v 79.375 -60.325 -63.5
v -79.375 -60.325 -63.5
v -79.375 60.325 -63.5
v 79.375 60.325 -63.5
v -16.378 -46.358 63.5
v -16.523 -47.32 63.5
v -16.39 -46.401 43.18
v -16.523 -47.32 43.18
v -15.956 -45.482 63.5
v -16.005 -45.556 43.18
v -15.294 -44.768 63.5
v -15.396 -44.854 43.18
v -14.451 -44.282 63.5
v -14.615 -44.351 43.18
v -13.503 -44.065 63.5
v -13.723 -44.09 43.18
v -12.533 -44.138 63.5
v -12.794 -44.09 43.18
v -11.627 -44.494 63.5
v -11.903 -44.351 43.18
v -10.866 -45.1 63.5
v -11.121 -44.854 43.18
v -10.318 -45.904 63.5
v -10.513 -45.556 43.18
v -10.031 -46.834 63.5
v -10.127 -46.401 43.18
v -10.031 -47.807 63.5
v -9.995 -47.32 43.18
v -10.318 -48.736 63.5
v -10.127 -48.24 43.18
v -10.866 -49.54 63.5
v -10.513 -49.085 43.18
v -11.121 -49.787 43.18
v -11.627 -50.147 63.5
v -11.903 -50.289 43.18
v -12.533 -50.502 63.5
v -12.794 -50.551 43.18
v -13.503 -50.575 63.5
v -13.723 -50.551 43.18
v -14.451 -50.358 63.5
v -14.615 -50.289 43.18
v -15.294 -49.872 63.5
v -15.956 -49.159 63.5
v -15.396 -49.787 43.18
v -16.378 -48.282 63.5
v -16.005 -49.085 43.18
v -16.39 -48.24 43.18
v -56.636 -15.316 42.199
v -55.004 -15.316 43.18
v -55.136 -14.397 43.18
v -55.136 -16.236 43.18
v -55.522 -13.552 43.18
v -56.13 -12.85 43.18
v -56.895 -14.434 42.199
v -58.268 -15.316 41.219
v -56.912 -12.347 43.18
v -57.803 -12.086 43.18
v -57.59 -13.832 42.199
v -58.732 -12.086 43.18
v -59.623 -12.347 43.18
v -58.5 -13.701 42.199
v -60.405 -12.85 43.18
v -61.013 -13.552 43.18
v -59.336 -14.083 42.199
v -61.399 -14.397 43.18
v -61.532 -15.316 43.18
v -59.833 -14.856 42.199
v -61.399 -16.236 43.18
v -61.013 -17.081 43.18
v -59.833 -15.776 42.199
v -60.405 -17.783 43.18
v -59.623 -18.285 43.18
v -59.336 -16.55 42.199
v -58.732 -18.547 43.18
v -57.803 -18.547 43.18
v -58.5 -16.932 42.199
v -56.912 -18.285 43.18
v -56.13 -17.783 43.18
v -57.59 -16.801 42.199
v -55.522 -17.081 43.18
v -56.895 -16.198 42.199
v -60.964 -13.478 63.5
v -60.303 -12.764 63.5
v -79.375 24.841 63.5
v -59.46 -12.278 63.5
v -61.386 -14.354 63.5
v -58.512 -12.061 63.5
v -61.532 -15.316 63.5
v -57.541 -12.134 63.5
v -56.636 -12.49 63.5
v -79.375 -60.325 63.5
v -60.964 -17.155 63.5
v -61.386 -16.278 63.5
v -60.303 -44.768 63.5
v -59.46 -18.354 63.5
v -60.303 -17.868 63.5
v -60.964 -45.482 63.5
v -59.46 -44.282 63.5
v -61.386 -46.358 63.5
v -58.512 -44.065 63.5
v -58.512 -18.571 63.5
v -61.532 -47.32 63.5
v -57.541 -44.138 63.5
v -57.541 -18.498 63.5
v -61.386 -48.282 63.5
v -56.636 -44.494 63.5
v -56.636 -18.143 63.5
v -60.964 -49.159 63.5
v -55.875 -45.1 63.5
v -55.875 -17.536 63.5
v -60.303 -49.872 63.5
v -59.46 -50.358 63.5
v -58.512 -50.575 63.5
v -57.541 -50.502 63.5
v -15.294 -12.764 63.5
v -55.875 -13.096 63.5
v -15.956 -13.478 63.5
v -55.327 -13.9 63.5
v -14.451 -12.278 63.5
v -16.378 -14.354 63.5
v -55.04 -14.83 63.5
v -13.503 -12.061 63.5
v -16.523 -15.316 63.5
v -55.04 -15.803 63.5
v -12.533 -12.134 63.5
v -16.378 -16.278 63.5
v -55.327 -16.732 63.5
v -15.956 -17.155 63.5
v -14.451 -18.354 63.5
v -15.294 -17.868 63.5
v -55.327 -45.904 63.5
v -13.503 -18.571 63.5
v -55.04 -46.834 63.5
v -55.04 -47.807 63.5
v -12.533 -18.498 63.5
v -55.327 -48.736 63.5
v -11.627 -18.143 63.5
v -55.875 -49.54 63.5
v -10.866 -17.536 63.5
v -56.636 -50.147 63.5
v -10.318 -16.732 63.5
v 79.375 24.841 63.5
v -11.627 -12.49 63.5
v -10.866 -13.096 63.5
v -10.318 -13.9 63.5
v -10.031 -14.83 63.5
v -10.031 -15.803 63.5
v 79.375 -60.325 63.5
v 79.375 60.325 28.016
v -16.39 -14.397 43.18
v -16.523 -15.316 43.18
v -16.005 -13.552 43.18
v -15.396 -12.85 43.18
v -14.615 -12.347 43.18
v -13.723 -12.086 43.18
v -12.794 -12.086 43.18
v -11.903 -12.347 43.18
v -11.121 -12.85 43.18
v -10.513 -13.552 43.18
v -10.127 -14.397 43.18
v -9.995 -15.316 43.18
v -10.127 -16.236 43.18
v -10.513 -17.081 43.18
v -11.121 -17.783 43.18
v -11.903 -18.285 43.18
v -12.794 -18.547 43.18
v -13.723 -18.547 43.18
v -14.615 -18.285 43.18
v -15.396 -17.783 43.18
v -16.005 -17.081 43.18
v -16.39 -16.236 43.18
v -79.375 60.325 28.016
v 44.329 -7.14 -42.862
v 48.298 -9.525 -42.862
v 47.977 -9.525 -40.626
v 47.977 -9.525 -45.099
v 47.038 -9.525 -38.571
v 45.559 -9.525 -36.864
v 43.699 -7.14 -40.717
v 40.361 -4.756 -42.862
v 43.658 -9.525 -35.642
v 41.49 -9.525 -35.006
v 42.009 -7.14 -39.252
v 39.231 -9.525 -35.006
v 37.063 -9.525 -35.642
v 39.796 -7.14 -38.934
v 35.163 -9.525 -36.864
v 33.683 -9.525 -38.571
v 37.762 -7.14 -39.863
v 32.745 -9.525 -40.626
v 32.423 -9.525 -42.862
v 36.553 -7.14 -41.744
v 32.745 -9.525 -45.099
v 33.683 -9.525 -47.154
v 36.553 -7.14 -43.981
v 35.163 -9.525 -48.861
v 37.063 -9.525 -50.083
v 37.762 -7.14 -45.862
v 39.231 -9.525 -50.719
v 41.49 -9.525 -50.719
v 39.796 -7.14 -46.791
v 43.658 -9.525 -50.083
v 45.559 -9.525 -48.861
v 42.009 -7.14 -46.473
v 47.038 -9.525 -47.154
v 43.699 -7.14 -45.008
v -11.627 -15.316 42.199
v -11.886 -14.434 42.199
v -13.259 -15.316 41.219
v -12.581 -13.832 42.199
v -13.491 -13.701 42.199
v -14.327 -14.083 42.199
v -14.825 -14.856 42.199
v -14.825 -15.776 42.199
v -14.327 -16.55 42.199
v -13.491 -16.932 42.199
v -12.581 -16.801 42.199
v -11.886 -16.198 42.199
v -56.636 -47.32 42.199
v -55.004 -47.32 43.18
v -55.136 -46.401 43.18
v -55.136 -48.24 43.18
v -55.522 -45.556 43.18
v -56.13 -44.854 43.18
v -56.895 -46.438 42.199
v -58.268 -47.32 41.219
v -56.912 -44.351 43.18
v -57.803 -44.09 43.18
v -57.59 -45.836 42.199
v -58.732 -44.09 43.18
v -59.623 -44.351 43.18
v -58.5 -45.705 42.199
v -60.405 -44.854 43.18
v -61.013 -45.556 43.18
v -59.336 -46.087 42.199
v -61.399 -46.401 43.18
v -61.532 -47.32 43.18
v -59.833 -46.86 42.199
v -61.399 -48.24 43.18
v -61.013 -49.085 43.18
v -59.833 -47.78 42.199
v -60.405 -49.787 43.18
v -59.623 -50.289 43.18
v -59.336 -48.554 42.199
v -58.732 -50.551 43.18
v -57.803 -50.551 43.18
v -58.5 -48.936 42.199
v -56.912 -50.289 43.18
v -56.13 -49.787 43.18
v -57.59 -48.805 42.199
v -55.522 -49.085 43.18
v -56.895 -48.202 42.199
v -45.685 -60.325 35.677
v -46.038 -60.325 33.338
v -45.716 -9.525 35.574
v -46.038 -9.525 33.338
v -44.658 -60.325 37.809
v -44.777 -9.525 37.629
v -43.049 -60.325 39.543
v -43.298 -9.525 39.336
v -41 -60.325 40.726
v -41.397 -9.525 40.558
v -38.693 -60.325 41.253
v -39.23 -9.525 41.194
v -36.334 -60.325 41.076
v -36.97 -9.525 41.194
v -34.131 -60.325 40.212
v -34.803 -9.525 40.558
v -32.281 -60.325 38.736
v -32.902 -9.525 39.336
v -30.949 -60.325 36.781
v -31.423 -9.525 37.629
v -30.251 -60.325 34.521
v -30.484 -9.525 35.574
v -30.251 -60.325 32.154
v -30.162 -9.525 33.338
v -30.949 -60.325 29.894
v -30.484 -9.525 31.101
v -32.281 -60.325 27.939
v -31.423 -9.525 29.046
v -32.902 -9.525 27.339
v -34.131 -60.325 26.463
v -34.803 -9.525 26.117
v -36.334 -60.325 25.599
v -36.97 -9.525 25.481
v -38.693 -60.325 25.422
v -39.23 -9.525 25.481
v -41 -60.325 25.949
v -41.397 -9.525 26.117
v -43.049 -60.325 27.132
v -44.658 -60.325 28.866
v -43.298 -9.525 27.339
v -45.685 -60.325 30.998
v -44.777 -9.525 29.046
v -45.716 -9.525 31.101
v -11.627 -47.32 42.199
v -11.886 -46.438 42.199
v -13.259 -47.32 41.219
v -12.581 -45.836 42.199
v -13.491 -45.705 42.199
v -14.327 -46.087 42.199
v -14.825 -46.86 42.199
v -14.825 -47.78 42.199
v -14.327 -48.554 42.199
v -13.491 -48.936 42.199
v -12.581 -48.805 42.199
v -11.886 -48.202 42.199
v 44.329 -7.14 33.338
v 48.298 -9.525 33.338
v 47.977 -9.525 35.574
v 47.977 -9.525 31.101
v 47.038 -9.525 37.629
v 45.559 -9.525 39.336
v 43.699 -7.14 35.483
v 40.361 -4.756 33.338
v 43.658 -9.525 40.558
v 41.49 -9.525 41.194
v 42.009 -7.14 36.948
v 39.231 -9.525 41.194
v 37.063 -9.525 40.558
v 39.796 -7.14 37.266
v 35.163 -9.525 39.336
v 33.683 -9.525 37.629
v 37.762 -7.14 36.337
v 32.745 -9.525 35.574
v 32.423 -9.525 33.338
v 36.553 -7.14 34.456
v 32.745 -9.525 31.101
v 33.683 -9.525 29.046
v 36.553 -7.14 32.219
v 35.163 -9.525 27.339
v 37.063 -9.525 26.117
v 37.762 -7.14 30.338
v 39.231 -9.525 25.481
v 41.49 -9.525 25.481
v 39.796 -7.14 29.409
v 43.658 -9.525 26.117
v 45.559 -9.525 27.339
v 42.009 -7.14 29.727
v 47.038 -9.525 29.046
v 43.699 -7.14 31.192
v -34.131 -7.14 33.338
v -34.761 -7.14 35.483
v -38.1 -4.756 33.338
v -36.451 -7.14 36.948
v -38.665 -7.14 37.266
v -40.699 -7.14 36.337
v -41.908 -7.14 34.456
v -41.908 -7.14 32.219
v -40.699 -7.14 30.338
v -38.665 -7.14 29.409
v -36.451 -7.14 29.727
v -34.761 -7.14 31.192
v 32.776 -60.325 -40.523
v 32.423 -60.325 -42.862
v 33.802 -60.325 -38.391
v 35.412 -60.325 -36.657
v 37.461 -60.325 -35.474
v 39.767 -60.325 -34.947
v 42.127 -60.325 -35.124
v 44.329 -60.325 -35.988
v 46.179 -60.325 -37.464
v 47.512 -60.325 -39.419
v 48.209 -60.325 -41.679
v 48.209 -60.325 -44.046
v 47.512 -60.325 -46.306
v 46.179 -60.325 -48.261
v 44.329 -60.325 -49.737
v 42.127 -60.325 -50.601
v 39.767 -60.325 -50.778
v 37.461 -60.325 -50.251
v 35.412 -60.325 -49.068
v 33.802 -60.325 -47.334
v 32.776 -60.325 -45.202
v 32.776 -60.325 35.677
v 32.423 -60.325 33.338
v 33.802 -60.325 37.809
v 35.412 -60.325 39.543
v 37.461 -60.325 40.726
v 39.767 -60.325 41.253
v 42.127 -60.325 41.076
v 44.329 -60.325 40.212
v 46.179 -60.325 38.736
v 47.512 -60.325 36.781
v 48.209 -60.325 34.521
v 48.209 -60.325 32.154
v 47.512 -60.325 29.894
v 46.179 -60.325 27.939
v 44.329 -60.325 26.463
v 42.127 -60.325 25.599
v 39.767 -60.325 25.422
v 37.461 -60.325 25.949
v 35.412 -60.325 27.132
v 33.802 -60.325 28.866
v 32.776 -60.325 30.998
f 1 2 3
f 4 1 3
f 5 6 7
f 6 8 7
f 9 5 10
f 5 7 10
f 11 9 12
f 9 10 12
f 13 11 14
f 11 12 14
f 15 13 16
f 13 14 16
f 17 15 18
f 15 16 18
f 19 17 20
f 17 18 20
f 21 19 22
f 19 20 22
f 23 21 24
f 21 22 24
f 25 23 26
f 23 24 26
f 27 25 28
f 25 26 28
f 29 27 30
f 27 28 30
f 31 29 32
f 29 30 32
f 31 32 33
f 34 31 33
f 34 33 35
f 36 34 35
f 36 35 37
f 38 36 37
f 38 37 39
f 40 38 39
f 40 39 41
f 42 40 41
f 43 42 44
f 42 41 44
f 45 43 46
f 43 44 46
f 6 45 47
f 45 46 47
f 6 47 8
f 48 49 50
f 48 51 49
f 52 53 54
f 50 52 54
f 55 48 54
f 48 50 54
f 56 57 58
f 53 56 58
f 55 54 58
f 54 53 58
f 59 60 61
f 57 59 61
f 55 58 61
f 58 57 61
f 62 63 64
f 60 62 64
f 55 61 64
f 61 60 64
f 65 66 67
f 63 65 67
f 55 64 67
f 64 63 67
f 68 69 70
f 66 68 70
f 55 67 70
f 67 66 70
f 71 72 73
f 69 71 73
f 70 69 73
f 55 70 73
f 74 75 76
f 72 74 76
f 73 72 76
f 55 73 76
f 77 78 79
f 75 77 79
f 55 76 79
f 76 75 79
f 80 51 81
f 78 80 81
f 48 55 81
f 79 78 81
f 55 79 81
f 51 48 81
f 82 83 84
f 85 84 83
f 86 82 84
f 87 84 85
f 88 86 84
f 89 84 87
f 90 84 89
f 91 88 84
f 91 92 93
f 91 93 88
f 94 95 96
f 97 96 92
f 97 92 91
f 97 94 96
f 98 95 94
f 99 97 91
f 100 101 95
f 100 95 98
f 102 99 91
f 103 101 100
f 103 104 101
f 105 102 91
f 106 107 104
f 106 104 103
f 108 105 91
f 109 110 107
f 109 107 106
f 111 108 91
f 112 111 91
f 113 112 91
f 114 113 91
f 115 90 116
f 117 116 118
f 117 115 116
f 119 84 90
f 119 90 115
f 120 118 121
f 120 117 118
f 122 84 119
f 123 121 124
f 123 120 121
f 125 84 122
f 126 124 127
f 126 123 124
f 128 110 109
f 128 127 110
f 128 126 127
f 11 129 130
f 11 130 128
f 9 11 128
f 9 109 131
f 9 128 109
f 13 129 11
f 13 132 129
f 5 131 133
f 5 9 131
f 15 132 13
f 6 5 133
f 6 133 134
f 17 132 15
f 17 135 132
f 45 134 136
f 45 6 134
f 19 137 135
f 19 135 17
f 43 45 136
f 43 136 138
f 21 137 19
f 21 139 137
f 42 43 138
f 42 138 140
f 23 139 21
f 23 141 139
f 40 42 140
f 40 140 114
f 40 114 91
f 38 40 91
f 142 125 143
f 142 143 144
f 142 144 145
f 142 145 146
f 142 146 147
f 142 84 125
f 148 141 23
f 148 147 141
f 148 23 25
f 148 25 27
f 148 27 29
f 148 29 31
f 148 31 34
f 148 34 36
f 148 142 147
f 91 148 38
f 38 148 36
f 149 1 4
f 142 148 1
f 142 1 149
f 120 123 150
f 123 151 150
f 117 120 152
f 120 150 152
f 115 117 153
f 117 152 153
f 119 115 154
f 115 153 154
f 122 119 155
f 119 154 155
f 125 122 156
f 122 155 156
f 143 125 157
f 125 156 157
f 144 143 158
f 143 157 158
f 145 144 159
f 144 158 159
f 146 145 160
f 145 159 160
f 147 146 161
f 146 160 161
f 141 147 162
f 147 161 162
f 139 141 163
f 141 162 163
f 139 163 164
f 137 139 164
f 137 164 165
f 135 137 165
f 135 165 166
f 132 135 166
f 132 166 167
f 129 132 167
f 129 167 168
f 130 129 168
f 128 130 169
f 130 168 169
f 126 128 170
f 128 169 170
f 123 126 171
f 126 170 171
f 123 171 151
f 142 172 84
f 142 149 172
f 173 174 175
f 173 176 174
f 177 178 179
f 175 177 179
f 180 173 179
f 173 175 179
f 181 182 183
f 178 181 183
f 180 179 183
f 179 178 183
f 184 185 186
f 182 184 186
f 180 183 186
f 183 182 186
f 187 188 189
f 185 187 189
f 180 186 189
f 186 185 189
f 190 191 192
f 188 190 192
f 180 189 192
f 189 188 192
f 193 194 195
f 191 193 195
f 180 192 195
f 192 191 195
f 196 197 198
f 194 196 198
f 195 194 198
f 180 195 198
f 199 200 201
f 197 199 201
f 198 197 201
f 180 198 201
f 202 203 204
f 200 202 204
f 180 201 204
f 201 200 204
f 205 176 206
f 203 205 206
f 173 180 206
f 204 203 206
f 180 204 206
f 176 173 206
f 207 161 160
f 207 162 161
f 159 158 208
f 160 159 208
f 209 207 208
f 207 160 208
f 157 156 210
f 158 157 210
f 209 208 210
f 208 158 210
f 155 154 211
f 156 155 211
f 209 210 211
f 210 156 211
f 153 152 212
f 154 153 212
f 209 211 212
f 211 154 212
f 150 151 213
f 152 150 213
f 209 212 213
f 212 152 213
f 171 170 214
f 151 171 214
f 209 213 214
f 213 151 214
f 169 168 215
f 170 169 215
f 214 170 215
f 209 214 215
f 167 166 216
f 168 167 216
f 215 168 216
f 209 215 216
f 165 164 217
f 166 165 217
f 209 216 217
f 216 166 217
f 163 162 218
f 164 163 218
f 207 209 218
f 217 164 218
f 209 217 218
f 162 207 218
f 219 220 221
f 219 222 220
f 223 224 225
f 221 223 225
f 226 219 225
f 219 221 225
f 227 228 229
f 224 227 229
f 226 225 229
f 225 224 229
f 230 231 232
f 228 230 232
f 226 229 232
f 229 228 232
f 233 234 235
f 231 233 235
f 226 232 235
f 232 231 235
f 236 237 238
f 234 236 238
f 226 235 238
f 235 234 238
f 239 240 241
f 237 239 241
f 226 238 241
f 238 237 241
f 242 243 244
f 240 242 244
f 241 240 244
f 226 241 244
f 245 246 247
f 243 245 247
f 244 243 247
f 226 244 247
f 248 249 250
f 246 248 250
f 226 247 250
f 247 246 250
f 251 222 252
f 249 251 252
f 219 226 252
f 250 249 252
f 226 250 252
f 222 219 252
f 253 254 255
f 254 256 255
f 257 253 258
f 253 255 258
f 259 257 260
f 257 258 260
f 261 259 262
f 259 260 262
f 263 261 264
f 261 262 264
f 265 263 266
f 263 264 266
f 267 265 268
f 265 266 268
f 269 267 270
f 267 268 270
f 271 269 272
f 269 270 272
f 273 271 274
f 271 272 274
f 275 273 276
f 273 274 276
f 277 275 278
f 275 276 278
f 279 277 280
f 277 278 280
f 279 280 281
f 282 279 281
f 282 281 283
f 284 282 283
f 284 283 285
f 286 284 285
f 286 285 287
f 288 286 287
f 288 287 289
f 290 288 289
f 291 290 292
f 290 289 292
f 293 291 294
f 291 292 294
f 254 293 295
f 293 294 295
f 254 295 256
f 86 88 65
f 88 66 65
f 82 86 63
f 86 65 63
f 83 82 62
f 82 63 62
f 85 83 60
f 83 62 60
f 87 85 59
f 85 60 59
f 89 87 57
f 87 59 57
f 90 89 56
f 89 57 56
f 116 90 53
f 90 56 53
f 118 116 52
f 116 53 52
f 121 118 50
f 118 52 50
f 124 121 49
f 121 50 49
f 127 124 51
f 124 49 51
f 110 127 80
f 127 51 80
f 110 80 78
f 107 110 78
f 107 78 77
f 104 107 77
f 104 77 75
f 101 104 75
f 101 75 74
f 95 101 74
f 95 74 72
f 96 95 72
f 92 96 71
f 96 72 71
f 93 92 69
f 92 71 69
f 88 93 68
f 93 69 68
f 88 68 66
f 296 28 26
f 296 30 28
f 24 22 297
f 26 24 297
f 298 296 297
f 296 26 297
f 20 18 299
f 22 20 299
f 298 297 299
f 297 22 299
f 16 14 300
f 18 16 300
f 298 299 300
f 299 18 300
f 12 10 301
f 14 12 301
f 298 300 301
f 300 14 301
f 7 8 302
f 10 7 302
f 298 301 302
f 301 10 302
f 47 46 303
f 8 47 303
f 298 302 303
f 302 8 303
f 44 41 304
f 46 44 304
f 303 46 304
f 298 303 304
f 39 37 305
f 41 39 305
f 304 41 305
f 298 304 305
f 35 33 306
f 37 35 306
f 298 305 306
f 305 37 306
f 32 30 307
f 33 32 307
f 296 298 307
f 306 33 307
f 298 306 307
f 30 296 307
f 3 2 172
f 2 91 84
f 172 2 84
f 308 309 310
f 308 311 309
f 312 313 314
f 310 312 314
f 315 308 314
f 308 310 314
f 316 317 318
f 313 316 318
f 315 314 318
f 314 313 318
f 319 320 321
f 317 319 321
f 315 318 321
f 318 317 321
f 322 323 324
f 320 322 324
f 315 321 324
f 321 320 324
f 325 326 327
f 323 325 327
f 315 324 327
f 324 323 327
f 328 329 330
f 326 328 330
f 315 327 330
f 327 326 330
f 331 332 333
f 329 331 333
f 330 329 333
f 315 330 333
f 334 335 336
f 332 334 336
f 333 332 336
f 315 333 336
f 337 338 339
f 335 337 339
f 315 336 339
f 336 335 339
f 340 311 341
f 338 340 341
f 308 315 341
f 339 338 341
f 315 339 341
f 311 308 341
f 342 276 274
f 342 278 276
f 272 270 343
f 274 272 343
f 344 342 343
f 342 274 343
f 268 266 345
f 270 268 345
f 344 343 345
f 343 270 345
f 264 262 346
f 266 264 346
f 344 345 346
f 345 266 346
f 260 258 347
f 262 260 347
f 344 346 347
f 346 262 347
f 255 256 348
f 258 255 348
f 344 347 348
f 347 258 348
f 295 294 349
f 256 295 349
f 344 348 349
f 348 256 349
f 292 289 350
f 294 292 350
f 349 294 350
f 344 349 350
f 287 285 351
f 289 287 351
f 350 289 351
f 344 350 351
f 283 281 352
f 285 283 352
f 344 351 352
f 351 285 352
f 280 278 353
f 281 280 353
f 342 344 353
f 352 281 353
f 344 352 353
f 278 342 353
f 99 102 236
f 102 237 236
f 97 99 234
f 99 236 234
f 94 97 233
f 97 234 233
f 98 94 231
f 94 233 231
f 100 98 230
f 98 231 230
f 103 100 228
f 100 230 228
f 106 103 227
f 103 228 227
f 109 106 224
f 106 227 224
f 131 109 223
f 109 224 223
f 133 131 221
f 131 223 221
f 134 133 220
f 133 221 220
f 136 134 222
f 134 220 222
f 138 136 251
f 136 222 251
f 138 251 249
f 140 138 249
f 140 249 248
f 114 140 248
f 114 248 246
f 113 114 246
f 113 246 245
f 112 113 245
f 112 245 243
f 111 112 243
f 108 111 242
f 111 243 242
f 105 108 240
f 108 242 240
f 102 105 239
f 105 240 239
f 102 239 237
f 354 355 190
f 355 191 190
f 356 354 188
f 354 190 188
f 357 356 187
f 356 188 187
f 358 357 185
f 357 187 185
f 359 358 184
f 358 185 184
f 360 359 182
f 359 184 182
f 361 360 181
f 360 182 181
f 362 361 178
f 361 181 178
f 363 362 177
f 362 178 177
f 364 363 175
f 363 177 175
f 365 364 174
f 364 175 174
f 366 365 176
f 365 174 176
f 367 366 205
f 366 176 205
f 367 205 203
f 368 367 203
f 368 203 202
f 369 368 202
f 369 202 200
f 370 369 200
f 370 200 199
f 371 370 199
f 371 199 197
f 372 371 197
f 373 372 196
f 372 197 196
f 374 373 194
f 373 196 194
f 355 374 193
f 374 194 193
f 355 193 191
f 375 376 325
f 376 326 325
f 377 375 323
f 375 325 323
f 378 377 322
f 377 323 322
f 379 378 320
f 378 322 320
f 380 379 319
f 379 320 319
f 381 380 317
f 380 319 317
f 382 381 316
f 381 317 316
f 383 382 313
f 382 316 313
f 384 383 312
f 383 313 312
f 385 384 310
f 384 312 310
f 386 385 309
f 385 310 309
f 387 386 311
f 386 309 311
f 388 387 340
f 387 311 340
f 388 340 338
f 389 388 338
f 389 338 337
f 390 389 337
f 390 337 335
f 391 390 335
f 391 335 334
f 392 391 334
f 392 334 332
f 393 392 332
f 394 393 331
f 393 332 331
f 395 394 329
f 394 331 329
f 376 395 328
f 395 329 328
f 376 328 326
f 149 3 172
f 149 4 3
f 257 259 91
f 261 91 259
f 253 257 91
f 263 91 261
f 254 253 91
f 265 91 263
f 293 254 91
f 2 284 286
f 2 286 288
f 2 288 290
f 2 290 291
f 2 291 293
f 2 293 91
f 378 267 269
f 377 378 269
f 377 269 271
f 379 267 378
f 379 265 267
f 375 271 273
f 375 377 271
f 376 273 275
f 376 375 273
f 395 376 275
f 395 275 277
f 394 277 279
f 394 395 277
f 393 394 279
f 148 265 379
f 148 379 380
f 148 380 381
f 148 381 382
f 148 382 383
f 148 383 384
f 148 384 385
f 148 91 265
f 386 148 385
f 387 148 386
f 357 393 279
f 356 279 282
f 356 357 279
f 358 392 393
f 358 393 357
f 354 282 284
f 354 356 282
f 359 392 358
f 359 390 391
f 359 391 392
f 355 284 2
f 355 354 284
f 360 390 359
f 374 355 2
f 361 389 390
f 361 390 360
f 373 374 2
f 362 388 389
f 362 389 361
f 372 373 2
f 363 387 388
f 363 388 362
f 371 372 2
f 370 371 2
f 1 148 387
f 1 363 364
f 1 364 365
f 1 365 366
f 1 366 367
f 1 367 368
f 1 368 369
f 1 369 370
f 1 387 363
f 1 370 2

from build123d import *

# Parameters (mm, degrees)
F1_DEPTH = 79.375
F3_D     = 15.875
F3_DEPTH = 50.8
F3_TIP   = 4.7693311635
F5_D     = 6.5278
F5_DEPTH = 20.32
F5_TIP   = 1.9611489744


with BuildPart() as f1:
    # F0 (on Right) → F1 (new body, symmetric)
    with BuildSketch(Plane.YZ):
        Polygon((60.325, 28.0162), (24.8412, 63.5), (-60.325, 63.5), (-60.325, -63.5), (60.325, -63.5), align=None)
    extrude(amount=F1_DEPTH, both=True)

    # F3
    with Locations(Plane.XZ.offset(60.325)):
        with Locations((-38.1, 33.3375), (40.3606, 33.3375), (40.3606, -42.8625)):
            Hole(F3_D / 2, depth=F3_DEPTH)
            with Locations((0, 0, -(F3_DEPTH + F3_TIP / 2))):  # 118° drill point
                Cone(0, F3_D / 2, F3_TIP, mode=Mode.SUBTRACT)

    # F5
    with Locations(Plane.XY.offset(63.5)):
        with Locations((-58.2676, -15.3162), (-58.2676, -47.3202), (-13.2588, -47.3202), (-13.2588, -15.3162)):
            Hole(F5_D / 2, depth=F5_DEPTH)
            with Locations((0, 0, -(F5_DEPTH + F5_TIP / 2))):  # 118° drill point
                Cone(0, F5_D / 2, F5_TIP, mode=Mode.SUBTRACT)


solid = f1.part
